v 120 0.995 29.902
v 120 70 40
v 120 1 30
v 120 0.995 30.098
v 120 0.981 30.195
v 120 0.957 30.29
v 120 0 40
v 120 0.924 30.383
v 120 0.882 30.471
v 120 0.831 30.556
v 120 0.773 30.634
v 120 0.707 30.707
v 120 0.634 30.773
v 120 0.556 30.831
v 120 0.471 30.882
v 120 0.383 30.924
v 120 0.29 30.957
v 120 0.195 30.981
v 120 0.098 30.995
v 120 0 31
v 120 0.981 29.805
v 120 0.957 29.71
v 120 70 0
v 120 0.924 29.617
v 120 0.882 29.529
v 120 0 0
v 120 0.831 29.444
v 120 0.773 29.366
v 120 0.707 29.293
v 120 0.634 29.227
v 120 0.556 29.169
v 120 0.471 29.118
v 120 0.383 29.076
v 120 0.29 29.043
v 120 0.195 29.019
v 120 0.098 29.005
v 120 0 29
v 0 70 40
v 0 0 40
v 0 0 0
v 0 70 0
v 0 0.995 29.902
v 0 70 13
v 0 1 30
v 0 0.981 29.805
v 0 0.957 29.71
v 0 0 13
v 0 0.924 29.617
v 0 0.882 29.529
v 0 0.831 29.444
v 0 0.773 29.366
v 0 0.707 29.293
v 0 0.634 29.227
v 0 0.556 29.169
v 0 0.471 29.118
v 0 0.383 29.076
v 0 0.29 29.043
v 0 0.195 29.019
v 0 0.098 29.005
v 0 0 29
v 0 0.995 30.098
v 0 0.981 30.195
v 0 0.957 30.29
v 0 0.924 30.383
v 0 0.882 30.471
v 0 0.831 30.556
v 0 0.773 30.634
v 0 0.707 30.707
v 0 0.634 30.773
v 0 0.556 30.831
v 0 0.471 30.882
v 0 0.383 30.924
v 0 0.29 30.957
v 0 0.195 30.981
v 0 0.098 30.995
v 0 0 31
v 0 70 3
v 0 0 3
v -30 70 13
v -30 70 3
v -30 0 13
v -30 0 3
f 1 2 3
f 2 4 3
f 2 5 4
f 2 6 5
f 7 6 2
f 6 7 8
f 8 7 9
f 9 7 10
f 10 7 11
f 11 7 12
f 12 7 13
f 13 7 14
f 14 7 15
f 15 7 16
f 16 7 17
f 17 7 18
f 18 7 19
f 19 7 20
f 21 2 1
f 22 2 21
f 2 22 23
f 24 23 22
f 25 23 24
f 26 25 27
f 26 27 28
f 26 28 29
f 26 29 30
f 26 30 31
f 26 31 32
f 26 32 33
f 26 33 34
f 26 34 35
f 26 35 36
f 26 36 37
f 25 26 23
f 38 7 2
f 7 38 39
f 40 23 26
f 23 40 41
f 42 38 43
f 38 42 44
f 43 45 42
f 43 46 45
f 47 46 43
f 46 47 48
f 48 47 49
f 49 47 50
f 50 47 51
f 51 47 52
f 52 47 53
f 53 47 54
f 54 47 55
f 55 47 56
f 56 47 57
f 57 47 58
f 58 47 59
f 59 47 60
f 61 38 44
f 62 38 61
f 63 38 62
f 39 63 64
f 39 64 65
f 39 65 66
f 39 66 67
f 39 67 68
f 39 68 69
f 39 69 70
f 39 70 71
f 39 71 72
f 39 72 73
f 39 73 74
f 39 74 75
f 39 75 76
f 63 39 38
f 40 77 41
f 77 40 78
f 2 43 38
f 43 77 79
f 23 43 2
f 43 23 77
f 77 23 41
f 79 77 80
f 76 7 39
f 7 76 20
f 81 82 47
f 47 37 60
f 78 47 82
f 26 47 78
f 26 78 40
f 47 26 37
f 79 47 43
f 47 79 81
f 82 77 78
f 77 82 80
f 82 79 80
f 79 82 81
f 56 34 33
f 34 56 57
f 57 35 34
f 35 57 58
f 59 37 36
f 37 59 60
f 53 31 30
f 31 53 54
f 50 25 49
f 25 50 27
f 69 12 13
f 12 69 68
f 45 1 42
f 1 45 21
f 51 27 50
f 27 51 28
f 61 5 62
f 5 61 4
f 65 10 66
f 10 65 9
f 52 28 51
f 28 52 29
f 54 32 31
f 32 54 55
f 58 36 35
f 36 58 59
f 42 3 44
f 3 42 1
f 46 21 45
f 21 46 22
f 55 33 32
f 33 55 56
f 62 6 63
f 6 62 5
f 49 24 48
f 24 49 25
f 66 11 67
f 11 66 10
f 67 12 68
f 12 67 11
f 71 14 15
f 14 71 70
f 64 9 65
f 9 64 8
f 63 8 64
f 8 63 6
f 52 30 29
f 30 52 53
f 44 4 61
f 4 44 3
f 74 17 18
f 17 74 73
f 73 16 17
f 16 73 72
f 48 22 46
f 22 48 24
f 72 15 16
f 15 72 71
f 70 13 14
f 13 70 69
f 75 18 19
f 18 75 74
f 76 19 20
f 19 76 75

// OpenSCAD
// Mini horizontal gel-electrophoresis box: open-top buffer tank with a central raised
// gel-tray platform and two horizontal end-wall holes for electrode wires.
// Print orientation: tank base on the XY plane, building up in +Z.

$fn = 64;

// ---------------- Dimensions (mm) ----------------
tank_x      = 120;   // outer length in X
tank_y      = 70;    // outer width in Y
tank_h      = 40;    // outer height in Z
wall        = 3;     // wall thickness (sides and floor)
floor       = 3;     // floor thickness under the inner floor
platform_x  = 60;    // platform length in X (centred)
platform_w  = tank_y; // platform spans the full inner width
platform_top = 13;   // height of the platform top (z = 13)
hole_d      = 2;     // electrode hole diameter
hole_z      = 30;    // electrode hole height
eps         = 0.5;   // cutter overshoot past faces

// ---------------- Derived ----------------
inner_h = tank_h - wall - floor;              // 34 mm inner height
platform_t = platform_top - floor;            // 10 mm above inner floor

// ---------------- Model ----------------
difference() {
    union() {
        // Tank body (outer solid)
        cube([tank_x, tank_y, tank_h]);

        // Central platform for the gel tray
        translate([-platform_x/2, 0, floor])
            cube([platform_x, platform_w, platform_t]);
    }

    // Two horizontal electrode holes through the end walls, along X, at y = 0
    for (sx = [-1, 1])
        translate([sx > 0 ? tank_x - eps : -eps, 0, hole_z])
            rotate([0, 90, 0])
                cylinder(d = hole_d, h = tank_x + 2*eps);
}
